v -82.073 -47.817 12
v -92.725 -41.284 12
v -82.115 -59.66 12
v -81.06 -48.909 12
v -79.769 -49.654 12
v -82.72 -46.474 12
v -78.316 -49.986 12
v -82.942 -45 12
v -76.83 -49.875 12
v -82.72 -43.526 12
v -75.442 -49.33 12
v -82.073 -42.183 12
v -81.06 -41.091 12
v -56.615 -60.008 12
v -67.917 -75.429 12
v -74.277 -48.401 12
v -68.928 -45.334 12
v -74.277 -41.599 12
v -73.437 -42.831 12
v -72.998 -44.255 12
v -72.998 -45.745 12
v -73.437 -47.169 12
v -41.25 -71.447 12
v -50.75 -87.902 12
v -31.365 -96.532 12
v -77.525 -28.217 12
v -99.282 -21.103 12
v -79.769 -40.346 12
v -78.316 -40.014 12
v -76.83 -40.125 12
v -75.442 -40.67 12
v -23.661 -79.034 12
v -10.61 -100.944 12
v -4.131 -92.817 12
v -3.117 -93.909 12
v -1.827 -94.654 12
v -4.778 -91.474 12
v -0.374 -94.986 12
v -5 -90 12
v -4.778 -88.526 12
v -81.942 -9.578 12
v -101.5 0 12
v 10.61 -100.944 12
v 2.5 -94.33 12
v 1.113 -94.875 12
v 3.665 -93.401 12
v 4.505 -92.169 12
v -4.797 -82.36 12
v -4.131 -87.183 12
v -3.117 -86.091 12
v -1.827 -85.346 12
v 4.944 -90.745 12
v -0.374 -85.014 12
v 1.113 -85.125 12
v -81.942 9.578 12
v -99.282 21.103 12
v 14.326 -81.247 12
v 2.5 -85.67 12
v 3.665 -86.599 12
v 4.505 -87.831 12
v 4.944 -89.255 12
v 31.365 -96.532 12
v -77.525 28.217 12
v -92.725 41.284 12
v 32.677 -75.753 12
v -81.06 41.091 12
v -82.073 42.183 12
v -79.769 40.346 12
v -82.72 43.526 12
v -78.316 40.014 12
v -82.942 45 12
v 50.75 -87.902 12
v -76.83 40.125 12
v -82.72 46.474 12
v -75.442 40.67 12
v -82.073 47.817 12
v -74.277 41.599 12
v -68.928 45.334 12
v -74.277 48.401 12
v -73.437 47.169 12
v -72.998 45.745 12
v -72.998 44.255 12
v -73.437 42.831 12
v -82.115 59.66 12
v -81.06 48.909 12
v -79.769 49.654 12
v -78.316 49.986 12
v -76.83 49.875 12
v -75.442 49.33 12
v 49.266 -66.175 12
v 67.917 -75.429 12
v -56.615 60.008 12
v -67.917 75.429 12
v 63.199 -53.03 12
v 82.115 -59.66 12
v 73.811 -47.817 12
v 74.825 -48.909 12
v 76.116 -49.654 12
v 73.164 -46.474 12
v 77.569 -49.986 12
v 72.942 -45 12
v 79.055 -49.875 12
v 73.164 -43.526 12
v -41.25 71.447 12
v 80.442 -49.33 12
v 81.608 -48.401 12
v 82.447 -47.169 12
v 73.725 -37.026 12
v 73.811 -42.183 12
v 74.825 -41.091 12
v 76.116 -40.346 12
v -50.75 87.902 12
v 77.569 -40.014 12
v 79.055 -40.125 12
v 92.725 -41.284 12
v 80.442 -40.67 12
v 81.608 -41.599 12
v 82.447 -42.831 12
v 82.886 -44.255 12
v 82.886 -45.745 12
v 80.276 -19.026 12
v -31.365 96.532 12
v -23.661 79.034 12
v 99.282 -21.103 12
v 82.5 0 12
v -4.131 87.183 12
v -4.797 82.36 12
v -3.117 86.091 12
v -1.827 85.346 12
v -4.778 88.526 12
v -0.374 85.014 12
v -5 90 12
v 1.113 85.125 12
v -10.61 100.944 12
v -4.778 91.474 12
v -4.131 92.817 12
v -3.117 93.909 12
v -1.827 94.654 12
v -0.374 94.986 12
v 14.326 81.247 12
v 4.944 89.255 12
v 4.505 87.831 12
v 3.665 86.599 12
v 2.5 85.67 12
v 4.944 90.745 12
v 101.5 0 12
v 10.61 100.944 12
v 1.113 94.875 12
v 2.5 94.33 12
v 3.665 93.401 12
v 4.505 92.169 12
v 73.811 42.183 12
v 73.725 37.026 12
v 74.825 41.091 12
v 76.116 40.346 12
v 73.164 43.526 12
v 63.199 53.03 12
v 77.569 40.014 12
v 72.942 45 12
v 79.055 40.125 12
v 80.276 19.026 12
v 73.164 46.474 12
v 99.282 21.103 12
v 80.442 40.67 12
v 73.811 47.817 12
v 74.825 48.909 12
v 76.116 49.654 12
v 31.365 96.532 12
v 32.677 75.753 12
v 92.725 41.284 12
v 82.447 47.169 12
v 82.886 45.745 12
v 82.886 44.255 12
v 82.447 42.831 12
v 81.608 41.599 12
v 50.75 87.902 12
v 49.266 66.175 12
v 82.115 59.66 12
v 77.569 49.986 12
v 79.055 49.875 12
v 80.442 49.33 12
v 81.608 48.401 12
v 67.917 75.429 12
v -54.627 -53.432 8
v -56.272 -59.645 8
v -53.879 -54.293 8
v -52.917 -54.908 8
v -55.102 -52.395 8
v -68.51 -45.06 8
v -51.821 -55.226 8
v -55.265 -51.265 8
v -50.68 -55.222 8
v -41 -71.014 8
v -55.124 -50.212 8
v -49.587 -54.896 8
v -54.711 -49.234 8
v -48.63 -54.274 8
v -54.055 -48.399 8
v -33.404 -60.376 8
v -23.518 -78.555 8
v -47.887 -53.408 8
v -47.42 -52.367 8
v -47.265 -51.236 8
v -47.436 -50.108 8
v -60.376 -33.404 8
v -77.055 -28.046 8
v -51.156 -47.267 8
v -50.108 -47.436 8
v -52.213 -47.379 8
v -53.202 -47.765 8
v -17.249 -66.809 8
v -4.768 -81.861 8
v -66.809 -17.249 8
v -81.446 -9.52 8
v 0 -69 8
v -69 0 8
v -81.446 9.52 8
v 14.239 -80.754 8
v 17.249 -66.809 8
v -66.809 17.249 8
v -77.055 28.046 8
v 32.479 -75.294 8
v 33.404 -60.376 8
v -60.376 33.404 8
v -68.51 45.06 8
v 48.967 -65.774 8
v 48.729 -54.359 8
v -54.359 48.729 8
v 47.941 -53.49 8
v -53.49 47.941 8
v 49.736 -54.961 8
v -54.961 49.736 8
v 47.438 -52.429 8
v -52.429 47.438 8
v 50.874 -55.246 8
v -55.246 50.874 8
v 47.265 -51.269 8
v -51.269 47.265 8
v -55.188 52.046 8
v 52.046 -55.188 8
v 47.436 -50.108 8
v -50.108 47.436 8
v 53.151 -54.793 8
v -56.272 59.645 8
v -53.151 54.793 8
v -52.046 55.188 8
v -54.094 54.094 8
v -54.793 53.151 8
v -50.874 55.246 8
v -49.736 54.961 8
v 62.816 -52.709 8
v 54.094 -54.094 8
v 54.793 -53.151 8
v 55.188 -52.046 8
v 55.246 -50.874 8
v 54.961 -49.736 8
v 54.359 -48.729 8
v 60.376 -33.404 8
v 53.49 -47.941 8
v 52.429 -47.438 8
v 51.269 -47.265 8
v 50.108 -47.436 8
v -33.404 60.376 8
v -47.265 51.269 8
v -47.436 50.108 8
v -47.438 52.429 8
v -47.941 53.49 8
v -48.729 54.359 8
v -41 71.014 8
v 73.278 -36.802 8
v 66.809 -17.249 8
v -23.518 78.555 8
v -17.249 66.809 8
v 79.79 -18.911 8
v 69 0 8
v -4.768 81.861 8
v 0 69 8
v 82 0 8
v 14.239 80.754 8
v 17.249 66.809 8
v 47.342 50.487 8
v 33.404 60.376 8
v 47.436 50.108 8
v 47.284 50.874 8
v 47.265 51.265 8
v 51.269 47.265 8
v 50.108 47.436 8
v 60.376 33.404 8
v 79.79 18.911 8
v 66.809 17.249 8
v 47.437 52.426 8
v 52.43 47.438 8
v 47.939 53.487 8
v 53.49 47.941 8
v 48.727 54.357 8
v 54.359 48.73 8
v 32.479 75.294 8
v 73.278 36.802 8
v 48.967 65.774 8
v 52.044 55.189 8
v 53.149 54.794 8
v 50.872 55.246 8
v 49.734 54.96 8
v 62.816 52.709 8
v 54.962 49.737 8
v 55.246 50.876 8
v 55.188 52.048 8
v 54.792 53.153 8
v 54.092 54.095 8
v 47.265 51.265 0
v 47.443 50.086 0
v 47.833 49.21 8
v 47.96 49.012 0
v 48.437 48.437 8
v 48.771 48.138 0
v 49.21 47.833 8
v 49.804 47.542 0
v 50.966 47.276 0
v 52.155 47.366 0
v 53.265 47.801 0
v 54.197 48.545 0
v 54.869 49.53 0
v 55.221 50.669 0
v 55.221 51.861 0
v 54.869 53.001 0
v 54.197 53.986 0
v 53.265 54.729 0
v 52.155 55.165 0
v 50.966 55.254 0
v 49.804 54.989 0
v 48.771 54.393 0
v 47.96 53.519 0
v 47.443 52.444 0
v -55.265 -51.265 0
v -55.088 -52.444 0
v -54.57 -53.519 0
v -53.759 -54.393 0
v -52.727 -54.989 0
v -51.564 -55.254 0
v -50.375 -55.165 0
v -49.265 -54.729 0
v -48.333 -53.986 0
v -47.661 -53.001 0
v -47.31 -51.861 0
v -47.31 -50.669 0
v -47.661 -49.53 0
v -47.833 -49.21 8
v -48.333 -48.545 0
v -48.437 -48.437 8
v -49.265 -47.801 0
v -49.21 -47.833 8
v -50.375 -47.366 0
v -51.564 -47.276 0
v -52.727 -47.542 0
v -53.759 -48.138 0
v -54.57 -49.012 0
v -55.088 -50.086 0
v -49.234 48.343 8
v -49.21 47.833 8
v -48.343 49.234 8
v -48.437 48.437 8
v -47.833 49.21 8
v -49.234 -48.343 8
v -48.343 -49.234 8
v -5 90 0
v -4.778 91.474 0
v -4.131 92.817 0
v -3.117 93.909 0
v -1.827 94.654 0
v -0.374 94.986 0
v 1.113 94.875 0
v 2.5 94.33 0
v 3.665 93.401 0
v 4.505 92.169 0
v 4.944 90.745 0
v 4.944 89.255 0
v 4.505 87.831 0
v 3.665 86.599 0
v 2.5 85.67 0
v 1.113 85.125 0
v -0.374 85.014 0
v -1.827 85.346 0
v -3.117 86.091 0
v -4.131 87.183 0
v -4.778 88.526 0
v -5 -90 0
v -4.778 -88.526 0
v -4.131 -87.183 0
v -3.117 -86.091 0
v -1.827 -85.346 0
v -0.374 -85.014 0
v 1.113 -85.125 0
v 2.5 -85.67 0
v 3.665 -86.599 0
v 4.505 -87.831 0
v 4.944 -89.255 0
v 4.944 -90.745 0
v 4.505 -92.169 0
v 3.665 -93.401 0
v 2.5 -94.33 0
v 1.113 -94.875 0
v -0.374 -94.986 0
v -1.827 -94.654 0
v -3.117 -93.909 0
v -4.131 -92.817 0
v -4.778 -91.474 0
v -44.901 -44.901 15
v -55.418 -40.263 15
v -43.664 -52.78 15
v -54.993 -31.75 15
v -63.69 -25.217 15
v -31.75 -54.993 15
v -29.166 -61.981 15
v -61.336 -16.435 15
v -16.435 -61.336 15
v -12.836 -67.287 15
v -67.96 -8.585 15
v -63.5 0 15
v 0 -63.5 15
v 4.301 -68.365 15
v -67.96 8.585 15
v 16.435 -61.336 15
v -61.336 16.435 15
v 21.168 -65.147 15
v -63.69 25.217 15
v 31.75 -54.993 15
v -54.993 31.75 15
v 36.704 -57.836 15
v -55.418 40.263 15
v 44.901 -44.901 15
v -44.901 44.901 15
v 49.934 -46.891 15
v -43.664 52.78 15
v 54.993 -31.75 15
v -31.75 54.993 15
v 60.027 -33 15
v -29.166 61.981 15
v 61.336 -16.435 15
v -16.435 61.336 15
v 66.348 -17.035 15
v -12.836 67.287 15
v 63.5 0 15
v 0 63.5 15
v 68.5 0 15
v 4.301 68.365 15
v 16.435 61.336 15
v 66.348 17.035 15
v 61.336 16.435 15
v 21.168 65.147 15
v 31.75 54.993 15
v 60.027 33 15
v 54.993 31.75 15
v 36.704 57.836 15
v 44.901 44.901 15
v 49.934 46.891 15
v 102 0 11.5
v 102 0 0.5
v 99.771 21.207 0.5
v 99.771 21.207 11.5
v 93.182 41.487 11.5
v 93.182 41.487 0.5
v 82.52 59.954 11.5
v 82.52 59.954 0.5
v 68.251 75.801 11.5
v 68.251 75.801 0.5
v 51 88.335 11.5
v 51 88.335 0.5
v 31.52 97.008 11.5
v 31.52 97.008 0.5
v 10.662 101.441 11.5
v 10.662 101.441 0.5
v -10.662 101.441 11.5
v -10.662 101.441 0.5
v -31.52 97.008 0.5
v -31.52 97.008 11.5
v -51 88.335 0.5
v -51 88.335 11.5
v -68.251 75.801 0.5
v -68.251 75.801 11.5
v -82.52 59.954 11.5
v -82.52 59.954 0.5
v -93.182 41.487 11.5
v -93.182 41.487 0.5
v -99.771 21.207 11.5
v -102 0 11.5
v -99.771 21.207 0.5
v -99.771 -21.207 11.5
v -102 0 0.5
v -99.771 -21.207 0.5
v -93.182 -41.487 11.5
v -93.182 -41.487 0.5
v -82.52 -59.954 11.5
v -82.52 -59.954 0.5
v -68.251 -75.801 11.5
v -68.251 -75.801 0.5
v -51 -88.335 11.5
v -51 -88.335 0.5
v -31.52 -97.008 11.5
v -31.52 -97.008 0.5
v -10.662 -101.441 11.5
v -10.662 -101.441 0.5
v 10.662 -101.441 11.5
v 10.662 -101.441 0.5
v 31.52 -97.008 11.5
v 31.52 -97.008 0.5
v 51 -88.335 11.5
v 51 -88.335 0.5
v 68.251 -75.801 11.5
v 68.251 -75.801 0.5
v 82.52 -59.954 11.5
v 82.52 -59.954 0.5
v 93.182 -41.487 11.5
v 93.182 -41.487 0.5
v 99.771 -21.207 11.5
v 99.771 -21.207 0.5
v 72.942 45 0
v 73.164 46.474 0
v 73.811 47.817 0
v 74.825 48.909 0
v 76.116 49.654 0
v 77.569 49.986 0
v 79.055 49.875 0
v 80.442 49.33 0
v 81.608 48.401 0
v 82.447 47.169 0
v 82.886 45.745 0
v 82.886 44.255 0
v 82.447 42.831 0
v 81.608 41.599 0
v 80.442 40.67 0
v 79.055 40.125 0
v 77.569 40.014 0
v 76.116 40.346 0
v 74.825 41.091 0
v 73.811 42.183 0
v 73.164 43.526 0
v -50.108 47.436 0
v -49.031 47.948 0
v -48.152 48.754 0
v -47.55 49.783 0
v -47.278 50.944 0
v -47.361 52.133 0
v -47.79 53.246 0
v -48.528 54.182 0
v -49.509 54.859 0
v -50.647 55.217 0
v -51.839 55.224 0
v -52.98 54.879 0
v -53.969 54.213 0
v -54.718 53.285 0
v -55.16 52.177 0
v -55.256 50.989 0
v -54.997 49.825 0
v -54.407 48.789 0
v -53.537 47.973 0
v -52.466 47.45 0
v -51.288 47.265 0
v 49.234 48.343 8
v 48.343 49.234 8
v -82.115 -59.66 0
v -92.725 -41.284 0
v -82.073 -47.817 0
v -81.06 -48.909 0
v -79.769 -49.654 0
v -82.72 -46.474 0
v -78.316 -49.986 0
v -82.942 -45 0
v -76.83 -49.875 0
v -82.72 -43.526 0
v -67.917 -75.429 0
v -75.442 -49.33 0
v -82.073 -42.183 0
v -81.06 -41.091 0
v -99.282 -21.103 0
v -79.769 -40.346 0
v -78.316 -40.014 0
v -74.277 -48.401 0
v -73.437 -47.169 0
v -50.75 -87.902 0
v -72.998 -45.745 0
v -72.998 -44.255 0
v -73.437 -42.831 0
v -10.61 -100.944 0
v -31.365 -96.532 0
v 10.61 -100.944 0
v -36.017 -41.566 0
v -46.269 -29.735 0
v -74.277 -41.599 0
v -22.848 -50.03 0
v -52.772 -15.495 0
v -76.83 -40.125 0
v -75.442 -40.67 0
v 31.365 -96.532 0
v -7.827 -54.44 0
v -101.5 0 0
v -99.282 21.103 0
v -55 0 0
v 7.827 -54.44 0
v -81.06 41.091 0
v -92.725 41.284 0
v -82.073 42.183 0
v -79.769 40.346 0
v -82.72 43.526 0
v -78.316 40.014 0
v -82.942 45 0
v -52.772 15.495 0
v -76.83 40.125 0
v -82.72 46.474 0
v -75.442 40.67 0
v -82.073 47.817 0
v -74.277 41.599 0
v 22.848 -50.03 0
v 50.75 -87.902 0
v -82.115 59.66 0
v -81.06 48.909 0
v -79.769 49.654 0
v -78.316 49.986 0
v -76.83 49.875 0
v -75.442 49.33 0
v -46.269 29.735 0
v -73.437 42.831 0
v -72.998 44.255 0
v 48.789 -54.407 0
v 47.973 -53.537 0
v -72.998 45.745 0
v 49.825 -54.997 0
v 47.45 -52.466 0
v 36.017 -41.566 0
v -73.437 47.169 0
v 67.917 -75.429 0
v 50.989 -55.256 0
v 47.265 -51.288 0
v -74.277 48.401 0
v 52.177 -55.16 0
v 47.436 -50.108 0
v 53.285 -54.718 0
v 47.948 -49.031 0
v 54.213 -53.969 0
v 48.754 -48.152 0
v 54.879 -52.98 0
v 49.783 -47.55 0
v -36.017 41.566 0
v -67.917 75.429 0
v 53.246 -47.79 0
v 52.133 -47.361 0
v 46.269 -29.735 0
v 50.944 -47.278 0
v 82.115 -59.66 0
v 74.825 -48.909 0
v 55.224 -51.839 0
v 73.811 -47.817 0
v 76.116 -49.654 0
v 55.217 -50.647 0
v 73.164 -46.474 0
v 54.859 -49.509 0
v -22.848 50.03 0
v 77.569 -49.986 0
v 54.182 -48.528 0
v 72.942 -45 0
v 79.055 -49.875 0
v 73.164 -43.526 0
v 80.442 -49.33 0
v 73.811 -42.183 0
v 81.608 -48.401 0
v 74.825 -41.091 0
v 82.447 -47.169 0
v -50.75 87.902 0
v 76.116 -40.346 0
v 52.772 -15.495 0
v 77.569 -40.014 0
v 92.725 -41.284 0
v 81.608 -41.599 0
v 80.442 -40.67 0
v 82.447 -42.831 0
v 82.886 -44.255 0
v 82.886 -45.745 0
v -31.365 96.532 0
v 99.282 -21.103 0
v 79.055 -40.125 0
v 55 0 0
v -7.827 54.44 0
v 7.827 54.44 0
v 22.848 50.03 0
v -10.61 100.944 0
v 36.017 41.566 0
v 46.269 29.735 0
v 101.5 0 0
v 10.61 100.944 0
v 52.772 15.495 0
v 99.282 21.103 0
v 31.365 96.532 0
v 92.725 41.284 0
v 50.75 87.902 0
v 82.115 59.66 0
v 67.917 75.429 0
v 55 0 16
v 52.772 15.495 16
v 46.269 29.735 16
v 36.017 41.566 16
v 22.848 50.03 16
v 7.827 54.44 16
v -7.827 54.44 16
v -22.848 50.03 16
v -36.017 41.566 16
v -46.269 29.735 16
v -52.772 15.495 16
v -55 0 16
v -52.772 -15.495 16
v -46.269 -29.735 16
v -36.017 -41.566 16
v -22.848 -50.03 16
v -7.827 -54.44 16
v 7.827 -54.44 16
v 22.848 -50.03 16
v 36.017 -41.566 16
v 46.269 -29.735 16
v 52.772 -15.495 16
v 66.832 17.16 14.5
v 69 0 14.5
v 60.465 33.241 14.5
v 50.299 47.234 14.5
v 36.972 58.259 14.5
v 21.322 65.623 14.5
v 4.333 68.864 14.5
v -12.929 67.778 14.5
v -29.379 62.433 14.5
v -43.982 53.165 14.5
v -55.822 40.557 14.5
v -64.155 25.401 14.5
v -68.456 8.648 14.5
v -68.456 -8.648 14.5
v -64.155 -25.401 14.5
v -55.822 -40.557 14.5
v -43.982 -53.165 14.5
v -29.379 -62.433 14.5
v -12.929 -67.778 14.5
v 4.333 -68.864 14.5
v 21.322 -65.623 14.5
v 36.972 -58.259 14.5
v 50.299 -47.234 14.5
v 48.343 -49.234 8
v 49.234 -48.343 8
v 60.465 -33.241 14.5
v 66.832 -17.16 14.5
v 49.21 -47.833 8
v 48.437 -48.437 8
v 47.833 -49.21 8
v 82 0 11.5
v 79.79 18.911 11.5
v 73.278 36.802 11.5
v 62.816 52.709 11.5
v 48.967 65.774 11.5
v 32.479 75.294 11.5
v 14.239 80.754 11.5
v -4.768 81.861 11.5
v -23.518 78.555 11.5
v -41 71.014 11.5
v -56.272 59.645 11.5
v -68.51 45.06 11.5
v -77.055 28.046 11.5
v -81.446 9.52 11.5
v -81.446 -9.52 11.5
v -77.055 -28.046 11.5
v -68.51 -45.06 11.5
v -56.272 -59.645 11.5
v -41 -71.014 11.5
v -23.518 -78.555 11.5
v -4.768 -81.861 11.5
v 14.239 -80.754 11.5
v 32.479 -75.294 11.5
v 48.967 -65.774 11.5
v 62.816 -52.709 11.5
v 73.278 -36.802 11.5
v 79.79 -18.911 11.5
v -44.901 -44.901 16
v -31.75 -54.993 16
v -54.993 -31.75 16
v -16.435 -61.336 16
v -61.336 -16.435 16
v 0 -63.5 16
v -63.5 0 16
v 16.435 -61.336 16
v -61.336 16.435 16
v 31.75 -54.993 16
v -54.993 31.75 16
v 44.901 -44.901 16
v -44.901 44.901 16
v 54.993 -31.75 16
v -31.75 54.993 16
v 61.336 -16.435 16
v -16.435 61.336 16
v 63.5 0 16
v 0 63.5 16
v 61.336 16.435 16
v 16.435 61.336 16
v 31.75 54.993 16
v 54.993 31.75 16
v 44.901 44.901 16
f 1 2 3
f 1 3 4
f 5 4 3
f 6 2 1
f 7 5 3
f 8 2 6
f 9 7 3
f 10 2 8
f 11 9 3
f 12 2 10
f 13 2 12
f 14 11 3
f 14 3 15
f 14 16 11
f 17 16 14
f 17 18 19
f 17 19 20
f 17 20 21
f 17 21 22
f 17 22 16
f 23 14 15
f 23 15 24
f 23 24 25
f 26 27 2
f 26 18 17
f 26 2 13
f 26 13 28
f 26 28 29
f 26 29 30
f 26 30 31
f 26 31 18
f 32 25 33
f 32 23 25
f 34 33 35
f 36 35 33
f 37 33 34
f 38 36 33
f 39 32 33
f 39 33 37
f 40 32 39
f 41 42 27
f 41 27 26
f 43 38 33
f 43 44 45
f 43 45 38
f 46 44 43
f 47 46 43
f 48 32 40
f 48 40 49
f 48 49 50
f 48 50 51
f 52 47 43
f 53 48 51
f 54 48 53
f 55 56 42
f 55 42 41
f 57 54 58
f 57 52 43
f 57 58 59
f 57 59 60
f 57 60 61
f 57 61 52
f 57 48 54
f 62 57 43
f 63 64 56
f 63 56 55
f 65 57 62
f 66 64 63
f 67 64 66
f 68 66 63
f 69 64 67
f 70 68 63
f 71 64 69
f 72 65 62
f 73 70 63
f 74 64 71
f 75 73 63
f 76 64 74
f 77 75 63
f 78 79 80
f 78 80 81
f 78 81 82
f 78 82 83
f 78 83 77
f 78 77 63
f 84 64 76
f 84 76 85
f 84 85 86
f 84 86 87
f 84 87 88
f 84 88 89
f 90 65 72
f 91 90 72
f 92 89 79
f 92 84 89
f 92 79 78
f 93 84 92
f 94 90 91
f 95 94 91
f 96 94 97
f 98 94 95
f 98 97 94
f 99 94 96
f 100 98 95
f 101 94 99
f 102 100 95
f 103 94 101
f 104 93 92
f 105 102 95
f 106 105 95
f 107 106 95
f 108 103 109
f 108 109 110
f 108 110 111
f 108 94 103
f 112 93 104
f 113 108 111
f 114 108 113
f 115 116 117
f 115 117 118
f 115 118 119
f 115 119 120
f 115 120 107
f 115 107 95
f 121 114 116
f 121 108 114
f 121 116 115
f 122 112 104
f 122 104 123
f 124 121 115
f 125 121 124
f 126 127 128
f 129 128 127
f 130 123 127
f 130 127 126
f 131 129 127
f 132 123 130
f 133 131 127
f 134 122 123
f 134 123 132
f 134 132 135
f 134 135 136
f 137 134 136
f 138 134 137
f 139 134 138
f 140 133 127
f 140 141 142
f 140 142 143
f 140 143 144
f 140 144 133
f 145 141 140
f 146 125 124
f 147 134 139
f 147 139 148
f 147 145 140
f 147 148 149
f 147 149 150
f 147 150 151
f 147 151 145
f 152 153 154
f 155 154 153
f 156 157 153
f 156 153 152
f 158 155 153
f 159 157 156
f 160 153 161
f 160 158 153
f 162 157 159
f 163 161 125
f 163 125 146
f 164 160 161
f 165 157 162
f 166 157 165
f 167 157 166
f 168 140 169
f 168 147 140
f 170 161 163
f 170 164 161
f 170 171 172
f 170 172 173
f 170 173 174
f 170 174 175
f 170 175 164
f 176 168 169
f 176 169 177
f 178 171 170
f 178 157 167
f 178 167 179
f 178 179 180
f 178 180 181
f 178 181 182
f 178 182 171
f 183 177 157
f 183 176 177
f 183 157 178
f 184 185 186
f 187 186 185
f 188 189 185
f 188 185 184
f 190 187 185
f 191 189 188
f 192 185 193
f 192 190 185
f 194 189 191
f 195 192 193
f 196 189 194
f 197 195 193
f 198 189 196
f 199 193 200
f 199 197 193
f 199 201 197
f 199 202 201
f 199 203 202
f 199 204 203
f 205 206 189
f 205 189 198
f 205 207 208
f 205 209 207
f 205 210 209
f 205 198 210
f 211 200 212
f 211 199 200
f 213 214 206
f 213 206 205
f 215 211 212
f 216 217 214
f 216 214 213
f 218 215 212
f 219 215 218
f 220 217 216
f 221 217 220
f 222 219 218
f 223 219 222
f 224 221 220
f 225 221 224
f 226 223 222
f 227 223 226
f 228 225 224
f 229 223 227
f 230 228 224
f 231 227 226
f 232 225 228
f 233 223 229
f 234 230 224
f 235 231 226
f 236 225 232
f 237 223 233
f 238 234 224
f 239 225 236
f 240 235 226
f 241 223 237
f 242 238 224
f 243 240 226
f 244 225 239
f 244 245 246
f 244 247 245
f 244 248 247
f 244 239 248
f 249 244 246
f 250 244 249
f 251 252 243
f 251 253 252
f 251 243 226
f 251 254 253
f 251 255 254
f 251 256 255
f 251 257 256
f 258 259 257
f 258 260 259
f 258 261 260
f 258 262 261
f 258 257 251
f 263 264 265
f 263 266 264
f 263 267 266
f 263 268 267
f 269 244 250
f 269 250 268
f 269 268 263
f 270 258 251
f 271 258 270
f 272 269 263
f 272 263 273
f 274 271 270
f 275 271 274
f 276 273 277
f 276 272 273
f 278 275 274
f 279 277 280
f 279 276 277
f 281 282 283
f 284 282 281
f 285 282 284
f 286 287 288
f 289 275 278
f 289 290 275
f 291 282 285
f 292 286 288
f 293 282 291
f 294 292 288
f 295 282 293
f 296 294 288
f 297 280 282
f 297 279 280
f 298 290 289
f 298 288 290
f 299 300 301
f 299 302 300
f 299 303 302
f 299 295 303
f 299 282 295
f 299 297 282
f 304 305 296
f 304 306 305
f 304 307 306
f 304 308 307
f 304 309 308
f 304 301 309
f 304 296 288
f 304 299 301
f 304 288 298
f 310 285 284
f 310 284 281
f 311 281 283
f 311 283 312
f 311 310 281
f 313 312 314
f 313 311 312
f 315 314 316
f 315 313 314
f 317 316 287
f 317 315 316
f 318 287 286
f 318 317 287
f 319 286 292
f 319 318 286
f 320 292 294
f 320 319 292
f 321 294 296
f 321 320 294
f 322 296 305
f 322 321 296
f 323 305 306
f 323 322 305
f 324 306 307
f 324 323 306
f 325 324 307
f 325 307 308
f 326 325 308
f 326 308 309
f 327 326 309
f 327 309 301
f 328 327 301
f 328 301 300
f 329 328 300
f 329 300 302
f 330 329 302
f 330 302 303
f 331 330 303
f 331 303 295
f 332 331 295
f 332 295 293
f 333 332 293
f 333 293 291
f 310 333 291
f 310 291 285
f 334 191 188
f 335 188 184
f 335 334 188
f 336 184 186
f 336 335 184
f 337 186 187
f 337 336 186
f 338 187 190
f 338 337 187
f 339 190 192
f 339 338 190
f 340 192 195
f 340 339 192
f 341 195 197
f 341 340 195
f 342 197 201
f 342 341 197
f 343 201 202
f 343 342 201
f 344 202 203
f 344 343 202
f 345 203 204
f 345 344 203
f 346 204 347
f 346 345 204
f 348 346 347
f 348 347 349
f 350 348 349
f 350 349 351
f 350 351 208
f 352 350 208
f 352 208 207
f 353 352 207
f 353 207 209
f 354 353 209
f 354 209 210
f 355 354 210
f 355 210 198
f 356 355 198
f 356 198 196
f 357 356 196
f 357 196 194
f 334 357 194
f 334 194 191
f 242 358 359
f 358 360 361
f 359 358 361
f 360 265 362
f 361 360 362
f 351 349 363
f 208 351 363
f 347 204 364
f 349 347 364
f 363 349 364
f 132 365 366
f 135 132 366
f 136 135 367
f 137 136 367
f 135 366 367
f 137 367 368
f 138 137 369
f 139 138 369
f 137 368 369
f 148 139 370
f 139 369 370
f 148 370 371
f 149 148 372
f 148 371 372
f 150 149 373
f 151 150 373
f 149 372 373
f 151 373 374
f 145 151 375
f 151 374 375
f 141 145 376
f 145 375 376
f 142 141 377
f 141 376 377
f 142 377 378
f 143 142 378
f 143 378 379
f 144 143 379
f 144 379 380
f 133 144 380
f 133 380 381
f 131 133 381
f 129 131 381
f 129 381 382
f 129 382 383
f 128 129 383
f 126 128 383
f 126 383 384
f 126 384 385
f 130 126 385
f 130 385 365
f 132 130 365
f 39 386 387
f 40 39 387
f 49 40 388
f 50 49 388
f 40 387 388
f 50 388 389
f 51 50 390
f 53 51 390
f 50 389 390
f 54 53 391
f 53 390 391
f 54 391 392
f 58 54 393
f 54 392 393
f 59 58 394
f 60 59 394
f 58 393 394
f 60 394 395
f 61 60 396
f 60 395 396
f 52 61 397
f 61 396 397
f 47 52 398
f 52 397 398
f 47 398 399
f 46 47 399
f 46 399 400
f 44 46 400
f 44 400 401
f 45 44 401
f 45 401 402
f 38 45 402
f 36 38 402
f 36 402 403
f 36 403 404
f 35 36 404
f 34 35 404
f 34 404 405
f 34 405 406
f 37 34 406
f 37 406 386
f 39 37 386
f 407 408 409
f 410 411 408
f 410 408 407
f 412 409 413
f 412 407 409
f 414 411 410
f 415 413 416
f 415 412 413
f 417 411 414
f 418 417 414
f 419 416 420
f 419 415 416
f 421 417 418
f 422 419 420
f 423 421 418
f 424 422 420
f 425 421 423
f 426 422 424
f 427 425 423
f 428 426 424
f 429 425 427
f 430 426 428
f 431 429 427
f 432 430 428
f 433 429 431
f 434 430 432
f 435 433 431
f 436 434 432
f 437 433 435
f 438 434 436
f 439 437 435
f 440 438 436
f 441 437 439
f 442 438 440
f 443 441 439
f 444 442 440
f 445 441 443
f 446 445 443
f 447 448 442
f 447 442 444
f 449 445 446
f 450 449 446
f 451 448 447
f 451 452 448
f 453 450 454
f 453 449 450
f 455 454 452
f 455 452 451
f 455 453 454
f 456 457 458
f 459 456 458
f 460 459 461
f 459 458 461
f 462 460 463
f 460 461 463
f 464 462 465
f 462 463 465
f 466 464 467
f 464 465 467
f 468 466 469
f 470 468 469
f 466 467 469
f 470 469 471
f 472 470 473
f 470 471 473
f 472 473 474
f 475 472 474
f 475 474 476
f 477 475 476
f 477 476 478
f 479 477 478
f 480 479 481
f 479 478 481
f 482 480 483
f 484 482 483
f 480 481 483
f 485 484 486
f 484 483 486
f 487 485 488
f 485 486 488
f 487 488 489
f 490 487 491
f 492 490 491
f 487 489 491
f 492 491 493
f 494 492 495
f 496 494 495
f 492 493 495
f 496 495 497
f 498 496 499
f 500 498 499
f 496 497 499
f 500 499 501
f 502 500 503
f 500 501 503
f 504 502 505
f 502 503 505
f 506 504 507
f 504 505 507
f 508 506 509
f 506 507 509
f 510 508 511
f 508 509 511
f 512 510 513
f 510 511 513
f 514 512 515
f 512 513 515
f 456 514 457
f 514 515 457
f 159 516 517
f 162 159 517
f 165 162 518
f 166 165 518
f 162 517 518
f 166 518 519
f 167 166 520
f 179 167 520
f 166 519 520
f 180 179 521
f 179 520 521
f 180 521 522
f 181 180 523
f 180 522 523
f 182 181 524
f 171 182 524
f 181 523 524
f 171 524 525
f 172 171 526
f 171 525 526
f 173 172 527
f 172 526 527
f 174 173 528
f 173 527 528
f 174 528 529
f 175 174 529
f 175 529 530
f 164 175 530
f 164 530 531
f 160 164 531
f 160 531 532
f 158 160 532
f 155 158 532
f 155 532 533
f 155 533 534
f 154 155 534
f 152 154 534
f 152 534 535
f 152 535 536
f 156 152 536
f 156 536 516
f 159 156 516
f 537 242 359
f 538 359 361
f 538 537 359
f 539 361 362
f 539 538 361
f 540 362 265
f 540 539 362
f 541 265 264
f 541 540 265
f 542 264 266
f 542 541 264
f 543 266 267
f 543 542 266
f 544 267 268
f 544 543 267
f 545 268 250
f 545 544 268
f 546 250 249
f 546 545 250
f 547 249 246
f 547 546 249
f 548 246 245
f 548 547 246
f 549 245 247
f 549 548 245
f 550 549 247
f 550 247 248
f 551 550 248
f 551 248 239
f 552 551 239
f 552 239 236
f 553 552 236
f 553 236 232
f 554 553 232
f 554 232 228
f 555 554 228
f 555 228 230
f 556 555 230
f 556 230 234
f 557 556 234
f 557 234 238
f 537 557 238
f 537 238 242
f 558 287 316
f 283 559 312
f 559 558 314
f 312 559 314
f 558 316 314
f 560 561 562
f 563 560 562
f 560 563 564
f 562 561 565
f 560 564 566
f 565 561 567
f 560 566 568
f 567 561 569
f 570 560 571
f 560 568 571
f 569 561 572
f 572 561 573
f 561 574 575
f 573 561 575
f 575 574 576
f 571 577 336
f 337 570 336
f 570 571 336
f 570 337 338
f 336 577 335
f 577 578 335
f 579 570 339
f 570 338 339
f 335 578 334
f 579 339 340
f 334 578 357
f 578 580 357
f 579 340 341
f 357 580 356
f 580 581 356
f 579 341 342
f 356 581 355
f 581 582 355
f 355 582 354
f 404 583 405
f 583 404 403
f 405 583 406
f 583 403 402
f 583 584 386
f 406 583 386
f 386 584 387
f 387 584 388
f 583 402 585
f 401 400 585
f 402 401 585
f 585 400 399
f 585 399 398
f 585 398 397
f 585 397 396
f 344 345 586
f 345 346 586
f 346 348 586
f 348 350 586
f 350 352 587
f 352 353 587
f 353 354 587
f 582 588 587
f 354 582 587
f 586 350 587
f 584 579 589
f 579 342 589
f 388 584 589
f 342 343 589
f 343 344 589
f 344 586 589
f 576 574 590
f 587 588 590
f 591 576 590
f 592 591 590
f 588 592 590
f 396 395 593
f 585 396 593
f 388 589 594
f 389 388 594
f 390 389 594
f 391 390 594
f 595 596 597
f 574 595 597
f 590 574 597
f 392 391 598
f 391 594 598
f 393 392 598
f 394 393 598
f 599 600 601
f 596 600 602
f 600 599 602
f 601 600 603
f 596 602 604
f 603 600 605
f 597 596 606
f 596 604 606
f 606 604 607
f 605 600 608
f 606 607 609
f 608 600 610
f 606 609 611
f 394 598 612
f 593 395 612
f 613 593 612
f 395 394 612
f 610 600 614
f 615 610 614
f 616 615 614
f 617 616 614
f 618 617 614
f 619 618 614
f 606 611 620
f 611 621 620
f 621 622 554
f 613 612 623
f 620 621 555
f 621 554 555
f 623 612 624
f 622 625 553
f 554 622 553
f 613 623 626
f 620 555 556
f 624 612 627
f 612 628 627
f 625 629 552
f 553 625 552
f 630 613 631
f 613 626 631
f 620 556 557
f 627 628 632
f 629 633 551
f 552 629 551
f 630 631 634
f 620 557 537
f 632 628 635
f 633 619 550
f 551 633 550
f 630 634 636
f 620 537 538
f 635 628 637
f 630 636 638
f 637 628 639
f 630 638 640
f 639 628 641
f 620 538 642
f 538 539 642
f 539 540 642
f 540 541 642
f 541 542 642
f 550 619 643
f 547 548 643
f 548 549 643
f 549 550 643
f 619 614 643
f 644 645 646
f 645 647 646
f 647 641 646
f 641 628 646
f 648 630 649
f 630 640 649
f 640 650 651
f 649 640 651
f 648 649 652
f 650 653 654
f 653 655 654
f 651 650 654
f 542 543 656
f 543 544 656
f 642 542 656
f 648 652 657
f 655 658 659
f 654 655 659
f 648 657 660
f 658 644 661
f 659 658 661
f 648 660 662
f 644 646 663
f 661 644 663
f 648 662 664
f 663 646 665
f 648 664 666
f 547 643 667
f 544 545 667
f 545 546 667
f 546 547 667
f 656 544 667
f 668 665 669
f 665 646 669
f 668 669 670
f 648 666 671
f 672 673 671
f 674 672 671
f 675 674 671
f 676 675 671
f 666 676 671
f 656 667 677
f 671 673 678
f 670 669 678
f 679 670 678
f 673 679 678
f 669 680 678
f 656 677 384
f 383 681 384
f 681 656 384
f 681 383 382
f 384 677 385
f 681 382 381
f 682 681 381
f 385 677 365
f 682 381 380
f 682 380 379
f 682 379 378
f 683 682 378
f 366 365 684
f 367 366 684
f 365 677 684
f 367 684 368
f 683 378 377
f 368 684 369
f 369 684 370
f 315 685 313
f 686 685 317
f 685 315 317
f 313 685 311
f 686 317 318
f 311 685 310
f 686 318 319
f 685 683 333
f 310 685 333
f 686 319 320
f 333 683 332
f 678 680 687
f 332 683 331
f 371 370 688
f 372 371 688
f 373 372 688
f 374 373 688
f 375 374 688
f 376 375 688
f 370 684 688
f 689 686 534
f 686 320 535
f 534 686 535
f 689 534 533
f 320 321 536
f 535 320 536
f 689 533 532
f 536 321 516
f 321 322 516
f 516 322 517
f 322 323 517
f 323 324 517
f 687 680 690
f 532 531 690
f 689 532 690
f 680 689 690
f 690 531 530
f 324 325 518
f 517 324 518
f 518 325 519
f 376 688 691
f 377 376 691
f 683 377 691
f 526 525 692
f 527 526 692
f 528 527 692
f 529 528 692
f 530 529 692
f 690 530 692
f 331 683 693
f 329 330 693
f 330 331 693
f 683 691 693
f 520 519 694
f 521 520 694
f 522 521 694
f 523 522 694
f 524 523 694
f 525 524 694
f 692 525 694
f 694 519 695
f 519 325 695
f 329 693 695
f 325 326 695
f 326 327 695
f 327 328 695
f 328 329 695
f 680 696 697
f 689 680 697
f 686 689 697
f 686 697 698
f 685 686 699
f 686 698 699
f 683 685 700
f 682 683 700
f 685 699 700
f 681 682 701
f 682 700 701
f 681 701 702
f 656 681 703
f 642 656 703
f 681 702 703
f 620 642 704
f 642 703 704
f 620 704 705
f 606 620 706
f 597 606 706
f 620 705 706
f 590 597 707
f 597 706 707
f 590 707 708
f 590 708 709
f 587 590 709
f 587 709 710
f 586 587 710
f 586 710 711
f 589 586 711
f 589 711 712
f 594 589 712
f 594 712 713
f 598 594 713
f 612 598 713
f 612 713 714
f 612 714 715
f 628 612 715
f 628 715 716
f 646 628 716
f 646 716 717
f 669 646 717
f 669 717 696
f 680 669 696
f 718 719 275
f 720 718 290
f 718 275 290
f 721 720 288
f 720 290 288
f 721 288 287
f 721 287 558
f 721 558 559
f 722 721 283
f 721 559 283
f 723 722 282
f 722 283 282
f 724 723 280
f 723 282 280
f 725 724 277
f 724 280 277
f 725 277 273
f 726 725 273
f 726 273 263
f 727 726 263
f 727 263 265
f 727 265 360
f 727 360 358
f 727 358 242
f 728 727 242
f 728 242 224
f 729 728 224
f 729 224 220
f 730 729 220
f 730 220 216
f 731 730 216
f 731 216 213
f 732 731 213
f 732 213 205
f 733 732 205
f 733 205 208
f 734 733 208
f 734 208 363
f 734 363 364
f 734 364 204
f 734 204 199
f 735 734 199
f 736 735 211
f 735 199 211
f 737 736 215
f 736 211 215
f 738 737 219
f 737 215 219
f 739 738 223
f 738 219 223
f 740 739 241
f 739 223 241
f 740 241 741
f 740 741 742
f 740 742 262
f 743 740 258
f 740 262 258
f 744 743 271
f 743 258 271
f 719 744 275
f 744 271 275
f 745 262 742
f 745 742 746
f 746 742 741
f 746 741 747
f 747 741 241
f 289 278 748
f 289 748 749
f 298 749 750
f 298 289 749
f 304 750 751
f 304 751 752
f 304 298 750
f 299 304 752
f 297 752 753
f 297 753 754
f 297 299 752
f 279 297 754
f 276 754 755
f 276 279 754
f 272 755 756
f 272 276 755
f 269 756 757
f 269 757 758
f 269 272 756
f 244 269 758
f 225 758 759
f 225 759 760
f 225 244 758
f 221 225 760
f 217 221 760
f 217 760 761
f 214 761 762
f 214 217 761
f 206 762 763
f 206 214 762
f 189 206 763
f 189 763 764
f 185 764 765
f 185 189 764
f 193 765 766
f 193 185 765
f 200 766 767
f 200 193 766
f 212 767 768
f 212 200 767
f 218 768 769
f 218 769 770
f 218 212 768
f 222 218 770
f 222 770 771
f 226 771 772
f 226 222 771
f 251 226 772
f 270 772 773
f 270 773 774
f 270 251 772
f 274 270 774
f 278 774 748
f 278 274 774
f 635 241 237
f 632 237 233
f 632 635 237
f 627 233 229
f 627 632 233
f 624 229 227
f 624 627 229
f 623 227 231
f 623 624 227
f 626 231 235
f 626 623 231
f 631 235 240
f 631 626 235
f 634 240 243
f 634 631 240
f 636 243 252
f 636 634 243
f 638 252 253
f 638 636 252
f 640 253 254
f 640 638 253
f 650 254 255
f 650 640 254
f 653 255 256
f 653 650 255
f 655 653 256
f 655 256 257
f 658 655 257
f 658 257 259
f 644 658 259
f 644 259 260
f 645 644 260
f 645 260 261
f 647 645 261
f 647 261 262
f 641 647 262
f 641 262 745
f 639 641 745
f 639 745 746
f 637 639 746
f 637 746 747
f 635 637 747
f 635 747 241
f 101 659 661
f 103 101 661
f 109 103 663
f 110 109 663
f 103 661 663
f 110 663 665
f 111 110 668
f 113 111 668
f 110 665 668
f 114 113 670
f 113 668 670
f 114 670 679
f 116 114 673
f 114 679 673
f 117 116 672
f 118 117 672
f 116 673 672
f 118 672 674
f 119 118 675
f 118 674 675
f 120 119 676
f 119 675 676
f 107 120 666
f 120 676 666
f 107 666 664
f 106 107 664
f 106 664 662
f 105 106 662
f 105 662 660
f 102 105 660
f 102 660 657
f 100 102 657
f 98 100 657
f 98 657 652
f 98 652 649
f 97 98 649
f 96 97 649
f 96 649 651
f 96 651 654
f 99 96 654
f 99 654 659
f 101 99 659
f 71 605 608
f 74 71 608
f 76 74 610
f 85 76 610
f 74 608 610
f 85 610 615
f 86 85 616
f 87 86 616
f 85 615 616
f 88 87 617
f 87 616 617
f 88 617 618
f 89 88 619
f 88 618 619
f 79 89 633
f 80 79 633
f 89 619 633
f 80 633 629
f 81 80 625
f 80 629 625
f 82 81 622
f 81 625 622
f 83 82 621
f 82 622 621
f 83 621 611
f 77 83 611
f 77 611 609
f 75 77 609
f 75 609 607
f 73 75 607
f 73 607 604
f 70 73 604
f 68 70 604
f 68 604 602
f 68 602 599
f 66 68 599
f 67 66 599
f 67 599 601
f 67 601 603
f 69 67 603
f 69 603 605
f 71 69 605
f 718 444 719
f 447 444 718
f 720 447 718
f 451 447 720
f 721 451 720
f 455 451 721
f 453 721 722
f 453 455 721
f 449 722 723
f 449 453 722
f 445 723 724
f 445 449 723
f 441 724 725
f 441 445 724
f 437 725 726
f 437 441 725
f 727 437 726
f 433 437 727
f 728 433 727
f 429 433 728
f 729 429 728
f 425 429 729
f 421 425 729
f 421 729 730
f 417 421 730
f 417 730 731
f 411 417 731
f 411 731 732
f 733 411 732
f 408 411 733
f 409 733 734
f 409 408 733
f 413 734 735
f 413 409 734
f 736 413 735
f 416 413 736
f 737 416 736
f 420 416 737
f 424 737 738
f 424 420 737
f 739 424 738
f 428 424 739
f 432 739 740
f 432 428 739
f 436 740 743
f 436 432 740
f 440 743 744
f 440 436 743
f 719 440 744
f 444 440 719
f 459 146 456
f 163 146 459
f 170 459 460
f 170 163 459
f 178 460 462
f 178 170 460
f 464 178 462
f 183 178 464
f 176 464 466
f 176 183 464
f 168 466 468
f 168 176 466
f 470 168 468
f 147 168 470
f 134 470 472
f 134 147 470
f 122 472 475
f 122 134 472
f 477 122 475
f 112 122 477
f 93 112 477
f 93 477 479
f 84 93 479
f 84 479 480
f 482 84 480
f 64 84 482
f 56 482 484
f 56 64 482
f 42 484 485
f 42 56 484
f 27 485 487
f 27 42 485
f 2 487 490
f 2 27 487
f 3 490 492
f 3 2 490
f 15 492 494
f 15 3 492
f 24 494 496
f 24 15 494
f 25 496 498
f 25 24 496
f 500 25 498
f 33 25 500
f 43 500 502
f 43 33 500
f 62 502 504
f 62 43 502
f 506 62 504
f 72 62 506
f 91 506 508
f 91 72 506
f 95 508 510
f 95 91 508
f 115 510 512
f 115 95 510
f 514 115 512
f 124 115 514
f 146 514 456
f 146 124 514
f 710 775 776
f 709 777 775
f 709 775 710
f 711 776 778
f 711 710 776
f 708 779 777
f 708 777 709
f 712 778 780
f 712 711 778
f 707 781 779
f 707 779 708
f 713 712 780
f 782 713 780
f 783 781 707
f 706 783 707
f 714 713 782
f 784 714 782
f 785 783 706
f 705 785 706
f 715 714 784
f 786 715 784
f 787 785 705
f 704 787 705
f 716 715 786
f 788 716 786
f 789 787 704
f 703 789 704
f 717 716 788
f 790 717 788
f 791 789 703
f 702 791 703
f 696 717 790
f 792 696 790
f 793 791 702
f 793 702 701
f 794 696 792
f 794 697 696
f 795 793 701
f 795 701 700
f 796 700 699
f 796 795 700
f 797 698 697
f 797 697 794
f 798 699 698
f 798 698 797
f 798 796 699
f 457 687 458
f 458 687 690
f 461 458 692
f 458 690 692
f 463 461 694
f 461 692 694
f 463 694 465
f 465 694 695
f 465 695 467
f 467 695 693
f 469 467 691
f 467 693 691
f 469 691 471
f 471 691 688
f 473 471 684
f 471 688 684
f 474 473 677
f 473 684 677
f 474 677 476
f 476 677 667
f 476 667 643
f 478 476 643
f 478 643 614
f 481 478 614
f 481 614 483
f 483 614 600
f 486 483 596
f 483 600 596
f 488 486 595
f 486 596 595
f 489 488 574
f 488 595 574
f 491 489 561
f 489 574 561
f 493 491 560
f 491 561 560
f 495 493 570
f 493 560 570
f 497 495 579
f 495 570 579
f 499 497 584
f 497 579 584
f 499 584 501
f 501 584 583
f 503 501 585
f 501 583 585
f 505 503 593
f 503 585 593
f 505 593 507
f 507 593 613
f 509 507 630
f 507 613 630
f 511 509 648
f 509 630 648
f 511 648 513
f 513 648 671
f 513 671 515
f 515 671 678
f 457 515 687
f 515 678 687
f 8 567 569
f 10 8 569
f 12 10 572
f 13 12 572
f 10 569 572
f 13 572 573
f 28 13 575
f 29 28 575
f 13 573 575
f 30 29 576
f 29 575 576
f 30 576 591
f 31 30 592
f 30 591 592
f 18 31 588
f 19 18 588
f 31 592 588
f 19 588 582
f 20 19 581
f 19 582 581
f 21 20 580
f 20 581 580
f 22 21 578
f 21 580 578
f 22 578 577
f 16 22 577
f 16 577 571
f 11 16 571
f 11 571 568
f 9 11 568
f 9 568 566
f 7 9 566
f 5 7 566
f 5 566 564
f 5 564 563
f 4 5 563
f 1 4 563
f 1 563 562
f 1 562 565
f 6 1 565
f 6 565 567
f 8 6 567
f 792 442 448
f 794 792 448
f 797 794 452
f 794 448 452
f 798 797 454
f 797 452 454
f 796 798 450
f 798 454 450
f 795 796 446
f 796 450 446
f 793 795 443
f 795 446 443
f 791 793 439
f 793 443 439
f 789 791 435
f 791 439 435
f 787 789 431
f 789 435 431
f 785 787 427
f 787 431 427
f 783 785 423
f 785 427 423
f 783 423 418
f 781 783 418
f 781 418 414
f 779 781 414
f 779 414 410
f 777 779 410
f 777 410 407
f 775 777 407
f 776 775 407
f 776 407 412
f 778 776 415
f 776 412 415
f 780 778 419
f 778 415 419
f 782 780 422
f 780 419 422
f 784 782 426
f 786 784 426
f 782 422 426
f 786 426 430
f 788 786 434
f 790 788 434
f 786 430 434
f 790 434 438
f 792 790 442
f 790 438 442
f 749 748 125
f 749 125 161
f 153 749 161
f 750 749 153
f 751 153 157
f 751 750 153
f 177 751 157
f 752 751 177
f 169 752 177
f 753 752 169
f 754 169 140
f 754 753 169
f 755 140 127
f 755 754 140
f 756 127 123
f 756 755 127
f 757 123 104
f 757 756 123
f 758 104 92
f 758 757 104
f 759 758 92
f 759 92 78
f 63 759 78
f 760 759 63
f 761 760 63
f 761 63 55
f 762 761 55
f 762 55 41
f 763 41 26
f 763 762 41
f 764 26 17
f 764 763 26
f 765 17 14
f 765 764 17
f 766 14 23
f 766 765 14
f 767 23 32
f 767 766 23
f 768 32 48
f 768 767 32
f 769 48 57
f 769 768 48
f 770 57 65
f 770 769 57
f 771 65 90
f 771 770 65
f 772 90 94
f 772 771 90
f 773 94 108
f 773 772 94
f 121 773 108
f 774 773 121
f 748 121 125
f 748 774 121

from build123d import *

# Parameters (mm, degrees)
SKETCH_1_R          = 102
EXTRUDE_1_DEPTH     = 12
SKETCH_2_R          = 69
EXTRUDE_2_DEPTH     = 3
SKETCH_3_R          = 63.5
EXTRUDE_3_DEPTH     = 1
SKETCH_4_R          = 55
CUT_EXTRUDE_1_DEPTH = 146.134420452
CUT_EXTRUDE_START   = -8
SKETCH_5_R          = 82
SKETCH_5_R_2        = 69
CUT_EXTRUDE_2_DEPTH = 4
SKETCH_6_R          = 4
CUT_EXTRUDE_3_DEPTH = 8
SKETCH_7_R          = 5
CUT_EXTRUDE_4_DEPTH = 146.134420452
CHAMFER_1_SIZE      = 0.5


with BuildPart() as part:
    # 草图1 → 凸台-拉伸1 (new body)
    with BuildSketch(Plane.XY):
        Circle(SKETCH_1_R)
    extrude(amount=EXTRUDE_1_DEPTH)

    # 草图2 → 凸台-拉伸2 (add)
    with BuildSketch(Plane.XY.offset(12)):
        Circle(SKETCH_2_R)
    extrude(amount=EXTRUDE_2_DEPTH)

    # 草图3 → 凸台-拉伸3 (add)
    with BuildSketch(Plane.XY.offset(15)):
        Circle(SKETCH_3_R)
    extrude(amount=EXTRUDE_3_DEPTH)

    # 草图4 → 切除-拉伸1 (cut, through all)
    with BuildSketch(Plane.XY.offset(16)):
        Circle(SKETCH_4_R)
    extrude(amount=-CUT_EXTRUDE_1_DEPTH, mode=Mode.SUBTRACT)

    # 草图5 → 切除-拉伸2 (cut)
    with BuildSketch(Plane.XY.offset(16).offset(CUT_EXTRUDE_START)):
        Circle(SKETCH_5_R)
        Circle(SKETCH_5_R_2, mode=Mode.SUBTRACT)
    extrude(amount=CUT_EXTRUDE_2_DEPTH, mode=Mode.SUBTRACT)

    # 草图6 → 切除-拉伸3 (cut)
    with BuildSketch(Plane.XY):
        with Locations(Location((-51.265241636, 51.265241636, 0), (0, 0, 286.819656348))):
            Circle(SKETCH_6_R)
        with Locations(Location((51.265241636, 51.265241636, 0), (0, 0, 180))):
            Circle(SKETCH_6_R)
        with Locations(Location((51.265241636, -51.265241636, 0), (0, 0, 163.180343652))):
            Circle(SKETCH_6_R)
        with Locations(Location((-51.265241636, -51.265241636, 0), (0, 0, 180))):
            Circle(SKETCH_6_R)
    extrude(amount=CUT_EXTRUDE_3_DEPTH, mode=Mode.SUBTRACT)

    # 草图7 → 切除-拉伸4 (cut, through all)
    with BuildSketch(Plane(origin=(0, 0, 0), x_dir=(-1, 0, 0), z_dir=(0, 0, -1))):
        with Locations((-77.942286341, 45)):
            Circle(SKETCH_7_R)
        with Locations((0, 90)):
            Circle(SKETCH_7_R)
        with Locations((77.942286341, 45)):
            Circle(SKETCH_7_R)
        with Locations((77.942286341, -45)):
            Circle(SKETCH_7_R)
        with Locations((0, -90)):
            Circle(SKETCH_7_R)
        with Locations((-77.942286341, -45)):
            Circle(SKETCH_7_R)
    extrude(amount=-CUT_EXTRUDE_4_DEPTH, mode=Mode.SUBTRACT)

    # 倒角1
    chamfer_1_edges = [part.edges().sort_by_distance(p)[0] for p in [
        (-82, 0, 12),
        (-102, 0, 0),
        (-102, 0, 12),
        (-69, 0, 15),
    ]]
    chamfer(chamfer_1_edges, length=CHAMFER_1_SIZE)


solid = part.part
